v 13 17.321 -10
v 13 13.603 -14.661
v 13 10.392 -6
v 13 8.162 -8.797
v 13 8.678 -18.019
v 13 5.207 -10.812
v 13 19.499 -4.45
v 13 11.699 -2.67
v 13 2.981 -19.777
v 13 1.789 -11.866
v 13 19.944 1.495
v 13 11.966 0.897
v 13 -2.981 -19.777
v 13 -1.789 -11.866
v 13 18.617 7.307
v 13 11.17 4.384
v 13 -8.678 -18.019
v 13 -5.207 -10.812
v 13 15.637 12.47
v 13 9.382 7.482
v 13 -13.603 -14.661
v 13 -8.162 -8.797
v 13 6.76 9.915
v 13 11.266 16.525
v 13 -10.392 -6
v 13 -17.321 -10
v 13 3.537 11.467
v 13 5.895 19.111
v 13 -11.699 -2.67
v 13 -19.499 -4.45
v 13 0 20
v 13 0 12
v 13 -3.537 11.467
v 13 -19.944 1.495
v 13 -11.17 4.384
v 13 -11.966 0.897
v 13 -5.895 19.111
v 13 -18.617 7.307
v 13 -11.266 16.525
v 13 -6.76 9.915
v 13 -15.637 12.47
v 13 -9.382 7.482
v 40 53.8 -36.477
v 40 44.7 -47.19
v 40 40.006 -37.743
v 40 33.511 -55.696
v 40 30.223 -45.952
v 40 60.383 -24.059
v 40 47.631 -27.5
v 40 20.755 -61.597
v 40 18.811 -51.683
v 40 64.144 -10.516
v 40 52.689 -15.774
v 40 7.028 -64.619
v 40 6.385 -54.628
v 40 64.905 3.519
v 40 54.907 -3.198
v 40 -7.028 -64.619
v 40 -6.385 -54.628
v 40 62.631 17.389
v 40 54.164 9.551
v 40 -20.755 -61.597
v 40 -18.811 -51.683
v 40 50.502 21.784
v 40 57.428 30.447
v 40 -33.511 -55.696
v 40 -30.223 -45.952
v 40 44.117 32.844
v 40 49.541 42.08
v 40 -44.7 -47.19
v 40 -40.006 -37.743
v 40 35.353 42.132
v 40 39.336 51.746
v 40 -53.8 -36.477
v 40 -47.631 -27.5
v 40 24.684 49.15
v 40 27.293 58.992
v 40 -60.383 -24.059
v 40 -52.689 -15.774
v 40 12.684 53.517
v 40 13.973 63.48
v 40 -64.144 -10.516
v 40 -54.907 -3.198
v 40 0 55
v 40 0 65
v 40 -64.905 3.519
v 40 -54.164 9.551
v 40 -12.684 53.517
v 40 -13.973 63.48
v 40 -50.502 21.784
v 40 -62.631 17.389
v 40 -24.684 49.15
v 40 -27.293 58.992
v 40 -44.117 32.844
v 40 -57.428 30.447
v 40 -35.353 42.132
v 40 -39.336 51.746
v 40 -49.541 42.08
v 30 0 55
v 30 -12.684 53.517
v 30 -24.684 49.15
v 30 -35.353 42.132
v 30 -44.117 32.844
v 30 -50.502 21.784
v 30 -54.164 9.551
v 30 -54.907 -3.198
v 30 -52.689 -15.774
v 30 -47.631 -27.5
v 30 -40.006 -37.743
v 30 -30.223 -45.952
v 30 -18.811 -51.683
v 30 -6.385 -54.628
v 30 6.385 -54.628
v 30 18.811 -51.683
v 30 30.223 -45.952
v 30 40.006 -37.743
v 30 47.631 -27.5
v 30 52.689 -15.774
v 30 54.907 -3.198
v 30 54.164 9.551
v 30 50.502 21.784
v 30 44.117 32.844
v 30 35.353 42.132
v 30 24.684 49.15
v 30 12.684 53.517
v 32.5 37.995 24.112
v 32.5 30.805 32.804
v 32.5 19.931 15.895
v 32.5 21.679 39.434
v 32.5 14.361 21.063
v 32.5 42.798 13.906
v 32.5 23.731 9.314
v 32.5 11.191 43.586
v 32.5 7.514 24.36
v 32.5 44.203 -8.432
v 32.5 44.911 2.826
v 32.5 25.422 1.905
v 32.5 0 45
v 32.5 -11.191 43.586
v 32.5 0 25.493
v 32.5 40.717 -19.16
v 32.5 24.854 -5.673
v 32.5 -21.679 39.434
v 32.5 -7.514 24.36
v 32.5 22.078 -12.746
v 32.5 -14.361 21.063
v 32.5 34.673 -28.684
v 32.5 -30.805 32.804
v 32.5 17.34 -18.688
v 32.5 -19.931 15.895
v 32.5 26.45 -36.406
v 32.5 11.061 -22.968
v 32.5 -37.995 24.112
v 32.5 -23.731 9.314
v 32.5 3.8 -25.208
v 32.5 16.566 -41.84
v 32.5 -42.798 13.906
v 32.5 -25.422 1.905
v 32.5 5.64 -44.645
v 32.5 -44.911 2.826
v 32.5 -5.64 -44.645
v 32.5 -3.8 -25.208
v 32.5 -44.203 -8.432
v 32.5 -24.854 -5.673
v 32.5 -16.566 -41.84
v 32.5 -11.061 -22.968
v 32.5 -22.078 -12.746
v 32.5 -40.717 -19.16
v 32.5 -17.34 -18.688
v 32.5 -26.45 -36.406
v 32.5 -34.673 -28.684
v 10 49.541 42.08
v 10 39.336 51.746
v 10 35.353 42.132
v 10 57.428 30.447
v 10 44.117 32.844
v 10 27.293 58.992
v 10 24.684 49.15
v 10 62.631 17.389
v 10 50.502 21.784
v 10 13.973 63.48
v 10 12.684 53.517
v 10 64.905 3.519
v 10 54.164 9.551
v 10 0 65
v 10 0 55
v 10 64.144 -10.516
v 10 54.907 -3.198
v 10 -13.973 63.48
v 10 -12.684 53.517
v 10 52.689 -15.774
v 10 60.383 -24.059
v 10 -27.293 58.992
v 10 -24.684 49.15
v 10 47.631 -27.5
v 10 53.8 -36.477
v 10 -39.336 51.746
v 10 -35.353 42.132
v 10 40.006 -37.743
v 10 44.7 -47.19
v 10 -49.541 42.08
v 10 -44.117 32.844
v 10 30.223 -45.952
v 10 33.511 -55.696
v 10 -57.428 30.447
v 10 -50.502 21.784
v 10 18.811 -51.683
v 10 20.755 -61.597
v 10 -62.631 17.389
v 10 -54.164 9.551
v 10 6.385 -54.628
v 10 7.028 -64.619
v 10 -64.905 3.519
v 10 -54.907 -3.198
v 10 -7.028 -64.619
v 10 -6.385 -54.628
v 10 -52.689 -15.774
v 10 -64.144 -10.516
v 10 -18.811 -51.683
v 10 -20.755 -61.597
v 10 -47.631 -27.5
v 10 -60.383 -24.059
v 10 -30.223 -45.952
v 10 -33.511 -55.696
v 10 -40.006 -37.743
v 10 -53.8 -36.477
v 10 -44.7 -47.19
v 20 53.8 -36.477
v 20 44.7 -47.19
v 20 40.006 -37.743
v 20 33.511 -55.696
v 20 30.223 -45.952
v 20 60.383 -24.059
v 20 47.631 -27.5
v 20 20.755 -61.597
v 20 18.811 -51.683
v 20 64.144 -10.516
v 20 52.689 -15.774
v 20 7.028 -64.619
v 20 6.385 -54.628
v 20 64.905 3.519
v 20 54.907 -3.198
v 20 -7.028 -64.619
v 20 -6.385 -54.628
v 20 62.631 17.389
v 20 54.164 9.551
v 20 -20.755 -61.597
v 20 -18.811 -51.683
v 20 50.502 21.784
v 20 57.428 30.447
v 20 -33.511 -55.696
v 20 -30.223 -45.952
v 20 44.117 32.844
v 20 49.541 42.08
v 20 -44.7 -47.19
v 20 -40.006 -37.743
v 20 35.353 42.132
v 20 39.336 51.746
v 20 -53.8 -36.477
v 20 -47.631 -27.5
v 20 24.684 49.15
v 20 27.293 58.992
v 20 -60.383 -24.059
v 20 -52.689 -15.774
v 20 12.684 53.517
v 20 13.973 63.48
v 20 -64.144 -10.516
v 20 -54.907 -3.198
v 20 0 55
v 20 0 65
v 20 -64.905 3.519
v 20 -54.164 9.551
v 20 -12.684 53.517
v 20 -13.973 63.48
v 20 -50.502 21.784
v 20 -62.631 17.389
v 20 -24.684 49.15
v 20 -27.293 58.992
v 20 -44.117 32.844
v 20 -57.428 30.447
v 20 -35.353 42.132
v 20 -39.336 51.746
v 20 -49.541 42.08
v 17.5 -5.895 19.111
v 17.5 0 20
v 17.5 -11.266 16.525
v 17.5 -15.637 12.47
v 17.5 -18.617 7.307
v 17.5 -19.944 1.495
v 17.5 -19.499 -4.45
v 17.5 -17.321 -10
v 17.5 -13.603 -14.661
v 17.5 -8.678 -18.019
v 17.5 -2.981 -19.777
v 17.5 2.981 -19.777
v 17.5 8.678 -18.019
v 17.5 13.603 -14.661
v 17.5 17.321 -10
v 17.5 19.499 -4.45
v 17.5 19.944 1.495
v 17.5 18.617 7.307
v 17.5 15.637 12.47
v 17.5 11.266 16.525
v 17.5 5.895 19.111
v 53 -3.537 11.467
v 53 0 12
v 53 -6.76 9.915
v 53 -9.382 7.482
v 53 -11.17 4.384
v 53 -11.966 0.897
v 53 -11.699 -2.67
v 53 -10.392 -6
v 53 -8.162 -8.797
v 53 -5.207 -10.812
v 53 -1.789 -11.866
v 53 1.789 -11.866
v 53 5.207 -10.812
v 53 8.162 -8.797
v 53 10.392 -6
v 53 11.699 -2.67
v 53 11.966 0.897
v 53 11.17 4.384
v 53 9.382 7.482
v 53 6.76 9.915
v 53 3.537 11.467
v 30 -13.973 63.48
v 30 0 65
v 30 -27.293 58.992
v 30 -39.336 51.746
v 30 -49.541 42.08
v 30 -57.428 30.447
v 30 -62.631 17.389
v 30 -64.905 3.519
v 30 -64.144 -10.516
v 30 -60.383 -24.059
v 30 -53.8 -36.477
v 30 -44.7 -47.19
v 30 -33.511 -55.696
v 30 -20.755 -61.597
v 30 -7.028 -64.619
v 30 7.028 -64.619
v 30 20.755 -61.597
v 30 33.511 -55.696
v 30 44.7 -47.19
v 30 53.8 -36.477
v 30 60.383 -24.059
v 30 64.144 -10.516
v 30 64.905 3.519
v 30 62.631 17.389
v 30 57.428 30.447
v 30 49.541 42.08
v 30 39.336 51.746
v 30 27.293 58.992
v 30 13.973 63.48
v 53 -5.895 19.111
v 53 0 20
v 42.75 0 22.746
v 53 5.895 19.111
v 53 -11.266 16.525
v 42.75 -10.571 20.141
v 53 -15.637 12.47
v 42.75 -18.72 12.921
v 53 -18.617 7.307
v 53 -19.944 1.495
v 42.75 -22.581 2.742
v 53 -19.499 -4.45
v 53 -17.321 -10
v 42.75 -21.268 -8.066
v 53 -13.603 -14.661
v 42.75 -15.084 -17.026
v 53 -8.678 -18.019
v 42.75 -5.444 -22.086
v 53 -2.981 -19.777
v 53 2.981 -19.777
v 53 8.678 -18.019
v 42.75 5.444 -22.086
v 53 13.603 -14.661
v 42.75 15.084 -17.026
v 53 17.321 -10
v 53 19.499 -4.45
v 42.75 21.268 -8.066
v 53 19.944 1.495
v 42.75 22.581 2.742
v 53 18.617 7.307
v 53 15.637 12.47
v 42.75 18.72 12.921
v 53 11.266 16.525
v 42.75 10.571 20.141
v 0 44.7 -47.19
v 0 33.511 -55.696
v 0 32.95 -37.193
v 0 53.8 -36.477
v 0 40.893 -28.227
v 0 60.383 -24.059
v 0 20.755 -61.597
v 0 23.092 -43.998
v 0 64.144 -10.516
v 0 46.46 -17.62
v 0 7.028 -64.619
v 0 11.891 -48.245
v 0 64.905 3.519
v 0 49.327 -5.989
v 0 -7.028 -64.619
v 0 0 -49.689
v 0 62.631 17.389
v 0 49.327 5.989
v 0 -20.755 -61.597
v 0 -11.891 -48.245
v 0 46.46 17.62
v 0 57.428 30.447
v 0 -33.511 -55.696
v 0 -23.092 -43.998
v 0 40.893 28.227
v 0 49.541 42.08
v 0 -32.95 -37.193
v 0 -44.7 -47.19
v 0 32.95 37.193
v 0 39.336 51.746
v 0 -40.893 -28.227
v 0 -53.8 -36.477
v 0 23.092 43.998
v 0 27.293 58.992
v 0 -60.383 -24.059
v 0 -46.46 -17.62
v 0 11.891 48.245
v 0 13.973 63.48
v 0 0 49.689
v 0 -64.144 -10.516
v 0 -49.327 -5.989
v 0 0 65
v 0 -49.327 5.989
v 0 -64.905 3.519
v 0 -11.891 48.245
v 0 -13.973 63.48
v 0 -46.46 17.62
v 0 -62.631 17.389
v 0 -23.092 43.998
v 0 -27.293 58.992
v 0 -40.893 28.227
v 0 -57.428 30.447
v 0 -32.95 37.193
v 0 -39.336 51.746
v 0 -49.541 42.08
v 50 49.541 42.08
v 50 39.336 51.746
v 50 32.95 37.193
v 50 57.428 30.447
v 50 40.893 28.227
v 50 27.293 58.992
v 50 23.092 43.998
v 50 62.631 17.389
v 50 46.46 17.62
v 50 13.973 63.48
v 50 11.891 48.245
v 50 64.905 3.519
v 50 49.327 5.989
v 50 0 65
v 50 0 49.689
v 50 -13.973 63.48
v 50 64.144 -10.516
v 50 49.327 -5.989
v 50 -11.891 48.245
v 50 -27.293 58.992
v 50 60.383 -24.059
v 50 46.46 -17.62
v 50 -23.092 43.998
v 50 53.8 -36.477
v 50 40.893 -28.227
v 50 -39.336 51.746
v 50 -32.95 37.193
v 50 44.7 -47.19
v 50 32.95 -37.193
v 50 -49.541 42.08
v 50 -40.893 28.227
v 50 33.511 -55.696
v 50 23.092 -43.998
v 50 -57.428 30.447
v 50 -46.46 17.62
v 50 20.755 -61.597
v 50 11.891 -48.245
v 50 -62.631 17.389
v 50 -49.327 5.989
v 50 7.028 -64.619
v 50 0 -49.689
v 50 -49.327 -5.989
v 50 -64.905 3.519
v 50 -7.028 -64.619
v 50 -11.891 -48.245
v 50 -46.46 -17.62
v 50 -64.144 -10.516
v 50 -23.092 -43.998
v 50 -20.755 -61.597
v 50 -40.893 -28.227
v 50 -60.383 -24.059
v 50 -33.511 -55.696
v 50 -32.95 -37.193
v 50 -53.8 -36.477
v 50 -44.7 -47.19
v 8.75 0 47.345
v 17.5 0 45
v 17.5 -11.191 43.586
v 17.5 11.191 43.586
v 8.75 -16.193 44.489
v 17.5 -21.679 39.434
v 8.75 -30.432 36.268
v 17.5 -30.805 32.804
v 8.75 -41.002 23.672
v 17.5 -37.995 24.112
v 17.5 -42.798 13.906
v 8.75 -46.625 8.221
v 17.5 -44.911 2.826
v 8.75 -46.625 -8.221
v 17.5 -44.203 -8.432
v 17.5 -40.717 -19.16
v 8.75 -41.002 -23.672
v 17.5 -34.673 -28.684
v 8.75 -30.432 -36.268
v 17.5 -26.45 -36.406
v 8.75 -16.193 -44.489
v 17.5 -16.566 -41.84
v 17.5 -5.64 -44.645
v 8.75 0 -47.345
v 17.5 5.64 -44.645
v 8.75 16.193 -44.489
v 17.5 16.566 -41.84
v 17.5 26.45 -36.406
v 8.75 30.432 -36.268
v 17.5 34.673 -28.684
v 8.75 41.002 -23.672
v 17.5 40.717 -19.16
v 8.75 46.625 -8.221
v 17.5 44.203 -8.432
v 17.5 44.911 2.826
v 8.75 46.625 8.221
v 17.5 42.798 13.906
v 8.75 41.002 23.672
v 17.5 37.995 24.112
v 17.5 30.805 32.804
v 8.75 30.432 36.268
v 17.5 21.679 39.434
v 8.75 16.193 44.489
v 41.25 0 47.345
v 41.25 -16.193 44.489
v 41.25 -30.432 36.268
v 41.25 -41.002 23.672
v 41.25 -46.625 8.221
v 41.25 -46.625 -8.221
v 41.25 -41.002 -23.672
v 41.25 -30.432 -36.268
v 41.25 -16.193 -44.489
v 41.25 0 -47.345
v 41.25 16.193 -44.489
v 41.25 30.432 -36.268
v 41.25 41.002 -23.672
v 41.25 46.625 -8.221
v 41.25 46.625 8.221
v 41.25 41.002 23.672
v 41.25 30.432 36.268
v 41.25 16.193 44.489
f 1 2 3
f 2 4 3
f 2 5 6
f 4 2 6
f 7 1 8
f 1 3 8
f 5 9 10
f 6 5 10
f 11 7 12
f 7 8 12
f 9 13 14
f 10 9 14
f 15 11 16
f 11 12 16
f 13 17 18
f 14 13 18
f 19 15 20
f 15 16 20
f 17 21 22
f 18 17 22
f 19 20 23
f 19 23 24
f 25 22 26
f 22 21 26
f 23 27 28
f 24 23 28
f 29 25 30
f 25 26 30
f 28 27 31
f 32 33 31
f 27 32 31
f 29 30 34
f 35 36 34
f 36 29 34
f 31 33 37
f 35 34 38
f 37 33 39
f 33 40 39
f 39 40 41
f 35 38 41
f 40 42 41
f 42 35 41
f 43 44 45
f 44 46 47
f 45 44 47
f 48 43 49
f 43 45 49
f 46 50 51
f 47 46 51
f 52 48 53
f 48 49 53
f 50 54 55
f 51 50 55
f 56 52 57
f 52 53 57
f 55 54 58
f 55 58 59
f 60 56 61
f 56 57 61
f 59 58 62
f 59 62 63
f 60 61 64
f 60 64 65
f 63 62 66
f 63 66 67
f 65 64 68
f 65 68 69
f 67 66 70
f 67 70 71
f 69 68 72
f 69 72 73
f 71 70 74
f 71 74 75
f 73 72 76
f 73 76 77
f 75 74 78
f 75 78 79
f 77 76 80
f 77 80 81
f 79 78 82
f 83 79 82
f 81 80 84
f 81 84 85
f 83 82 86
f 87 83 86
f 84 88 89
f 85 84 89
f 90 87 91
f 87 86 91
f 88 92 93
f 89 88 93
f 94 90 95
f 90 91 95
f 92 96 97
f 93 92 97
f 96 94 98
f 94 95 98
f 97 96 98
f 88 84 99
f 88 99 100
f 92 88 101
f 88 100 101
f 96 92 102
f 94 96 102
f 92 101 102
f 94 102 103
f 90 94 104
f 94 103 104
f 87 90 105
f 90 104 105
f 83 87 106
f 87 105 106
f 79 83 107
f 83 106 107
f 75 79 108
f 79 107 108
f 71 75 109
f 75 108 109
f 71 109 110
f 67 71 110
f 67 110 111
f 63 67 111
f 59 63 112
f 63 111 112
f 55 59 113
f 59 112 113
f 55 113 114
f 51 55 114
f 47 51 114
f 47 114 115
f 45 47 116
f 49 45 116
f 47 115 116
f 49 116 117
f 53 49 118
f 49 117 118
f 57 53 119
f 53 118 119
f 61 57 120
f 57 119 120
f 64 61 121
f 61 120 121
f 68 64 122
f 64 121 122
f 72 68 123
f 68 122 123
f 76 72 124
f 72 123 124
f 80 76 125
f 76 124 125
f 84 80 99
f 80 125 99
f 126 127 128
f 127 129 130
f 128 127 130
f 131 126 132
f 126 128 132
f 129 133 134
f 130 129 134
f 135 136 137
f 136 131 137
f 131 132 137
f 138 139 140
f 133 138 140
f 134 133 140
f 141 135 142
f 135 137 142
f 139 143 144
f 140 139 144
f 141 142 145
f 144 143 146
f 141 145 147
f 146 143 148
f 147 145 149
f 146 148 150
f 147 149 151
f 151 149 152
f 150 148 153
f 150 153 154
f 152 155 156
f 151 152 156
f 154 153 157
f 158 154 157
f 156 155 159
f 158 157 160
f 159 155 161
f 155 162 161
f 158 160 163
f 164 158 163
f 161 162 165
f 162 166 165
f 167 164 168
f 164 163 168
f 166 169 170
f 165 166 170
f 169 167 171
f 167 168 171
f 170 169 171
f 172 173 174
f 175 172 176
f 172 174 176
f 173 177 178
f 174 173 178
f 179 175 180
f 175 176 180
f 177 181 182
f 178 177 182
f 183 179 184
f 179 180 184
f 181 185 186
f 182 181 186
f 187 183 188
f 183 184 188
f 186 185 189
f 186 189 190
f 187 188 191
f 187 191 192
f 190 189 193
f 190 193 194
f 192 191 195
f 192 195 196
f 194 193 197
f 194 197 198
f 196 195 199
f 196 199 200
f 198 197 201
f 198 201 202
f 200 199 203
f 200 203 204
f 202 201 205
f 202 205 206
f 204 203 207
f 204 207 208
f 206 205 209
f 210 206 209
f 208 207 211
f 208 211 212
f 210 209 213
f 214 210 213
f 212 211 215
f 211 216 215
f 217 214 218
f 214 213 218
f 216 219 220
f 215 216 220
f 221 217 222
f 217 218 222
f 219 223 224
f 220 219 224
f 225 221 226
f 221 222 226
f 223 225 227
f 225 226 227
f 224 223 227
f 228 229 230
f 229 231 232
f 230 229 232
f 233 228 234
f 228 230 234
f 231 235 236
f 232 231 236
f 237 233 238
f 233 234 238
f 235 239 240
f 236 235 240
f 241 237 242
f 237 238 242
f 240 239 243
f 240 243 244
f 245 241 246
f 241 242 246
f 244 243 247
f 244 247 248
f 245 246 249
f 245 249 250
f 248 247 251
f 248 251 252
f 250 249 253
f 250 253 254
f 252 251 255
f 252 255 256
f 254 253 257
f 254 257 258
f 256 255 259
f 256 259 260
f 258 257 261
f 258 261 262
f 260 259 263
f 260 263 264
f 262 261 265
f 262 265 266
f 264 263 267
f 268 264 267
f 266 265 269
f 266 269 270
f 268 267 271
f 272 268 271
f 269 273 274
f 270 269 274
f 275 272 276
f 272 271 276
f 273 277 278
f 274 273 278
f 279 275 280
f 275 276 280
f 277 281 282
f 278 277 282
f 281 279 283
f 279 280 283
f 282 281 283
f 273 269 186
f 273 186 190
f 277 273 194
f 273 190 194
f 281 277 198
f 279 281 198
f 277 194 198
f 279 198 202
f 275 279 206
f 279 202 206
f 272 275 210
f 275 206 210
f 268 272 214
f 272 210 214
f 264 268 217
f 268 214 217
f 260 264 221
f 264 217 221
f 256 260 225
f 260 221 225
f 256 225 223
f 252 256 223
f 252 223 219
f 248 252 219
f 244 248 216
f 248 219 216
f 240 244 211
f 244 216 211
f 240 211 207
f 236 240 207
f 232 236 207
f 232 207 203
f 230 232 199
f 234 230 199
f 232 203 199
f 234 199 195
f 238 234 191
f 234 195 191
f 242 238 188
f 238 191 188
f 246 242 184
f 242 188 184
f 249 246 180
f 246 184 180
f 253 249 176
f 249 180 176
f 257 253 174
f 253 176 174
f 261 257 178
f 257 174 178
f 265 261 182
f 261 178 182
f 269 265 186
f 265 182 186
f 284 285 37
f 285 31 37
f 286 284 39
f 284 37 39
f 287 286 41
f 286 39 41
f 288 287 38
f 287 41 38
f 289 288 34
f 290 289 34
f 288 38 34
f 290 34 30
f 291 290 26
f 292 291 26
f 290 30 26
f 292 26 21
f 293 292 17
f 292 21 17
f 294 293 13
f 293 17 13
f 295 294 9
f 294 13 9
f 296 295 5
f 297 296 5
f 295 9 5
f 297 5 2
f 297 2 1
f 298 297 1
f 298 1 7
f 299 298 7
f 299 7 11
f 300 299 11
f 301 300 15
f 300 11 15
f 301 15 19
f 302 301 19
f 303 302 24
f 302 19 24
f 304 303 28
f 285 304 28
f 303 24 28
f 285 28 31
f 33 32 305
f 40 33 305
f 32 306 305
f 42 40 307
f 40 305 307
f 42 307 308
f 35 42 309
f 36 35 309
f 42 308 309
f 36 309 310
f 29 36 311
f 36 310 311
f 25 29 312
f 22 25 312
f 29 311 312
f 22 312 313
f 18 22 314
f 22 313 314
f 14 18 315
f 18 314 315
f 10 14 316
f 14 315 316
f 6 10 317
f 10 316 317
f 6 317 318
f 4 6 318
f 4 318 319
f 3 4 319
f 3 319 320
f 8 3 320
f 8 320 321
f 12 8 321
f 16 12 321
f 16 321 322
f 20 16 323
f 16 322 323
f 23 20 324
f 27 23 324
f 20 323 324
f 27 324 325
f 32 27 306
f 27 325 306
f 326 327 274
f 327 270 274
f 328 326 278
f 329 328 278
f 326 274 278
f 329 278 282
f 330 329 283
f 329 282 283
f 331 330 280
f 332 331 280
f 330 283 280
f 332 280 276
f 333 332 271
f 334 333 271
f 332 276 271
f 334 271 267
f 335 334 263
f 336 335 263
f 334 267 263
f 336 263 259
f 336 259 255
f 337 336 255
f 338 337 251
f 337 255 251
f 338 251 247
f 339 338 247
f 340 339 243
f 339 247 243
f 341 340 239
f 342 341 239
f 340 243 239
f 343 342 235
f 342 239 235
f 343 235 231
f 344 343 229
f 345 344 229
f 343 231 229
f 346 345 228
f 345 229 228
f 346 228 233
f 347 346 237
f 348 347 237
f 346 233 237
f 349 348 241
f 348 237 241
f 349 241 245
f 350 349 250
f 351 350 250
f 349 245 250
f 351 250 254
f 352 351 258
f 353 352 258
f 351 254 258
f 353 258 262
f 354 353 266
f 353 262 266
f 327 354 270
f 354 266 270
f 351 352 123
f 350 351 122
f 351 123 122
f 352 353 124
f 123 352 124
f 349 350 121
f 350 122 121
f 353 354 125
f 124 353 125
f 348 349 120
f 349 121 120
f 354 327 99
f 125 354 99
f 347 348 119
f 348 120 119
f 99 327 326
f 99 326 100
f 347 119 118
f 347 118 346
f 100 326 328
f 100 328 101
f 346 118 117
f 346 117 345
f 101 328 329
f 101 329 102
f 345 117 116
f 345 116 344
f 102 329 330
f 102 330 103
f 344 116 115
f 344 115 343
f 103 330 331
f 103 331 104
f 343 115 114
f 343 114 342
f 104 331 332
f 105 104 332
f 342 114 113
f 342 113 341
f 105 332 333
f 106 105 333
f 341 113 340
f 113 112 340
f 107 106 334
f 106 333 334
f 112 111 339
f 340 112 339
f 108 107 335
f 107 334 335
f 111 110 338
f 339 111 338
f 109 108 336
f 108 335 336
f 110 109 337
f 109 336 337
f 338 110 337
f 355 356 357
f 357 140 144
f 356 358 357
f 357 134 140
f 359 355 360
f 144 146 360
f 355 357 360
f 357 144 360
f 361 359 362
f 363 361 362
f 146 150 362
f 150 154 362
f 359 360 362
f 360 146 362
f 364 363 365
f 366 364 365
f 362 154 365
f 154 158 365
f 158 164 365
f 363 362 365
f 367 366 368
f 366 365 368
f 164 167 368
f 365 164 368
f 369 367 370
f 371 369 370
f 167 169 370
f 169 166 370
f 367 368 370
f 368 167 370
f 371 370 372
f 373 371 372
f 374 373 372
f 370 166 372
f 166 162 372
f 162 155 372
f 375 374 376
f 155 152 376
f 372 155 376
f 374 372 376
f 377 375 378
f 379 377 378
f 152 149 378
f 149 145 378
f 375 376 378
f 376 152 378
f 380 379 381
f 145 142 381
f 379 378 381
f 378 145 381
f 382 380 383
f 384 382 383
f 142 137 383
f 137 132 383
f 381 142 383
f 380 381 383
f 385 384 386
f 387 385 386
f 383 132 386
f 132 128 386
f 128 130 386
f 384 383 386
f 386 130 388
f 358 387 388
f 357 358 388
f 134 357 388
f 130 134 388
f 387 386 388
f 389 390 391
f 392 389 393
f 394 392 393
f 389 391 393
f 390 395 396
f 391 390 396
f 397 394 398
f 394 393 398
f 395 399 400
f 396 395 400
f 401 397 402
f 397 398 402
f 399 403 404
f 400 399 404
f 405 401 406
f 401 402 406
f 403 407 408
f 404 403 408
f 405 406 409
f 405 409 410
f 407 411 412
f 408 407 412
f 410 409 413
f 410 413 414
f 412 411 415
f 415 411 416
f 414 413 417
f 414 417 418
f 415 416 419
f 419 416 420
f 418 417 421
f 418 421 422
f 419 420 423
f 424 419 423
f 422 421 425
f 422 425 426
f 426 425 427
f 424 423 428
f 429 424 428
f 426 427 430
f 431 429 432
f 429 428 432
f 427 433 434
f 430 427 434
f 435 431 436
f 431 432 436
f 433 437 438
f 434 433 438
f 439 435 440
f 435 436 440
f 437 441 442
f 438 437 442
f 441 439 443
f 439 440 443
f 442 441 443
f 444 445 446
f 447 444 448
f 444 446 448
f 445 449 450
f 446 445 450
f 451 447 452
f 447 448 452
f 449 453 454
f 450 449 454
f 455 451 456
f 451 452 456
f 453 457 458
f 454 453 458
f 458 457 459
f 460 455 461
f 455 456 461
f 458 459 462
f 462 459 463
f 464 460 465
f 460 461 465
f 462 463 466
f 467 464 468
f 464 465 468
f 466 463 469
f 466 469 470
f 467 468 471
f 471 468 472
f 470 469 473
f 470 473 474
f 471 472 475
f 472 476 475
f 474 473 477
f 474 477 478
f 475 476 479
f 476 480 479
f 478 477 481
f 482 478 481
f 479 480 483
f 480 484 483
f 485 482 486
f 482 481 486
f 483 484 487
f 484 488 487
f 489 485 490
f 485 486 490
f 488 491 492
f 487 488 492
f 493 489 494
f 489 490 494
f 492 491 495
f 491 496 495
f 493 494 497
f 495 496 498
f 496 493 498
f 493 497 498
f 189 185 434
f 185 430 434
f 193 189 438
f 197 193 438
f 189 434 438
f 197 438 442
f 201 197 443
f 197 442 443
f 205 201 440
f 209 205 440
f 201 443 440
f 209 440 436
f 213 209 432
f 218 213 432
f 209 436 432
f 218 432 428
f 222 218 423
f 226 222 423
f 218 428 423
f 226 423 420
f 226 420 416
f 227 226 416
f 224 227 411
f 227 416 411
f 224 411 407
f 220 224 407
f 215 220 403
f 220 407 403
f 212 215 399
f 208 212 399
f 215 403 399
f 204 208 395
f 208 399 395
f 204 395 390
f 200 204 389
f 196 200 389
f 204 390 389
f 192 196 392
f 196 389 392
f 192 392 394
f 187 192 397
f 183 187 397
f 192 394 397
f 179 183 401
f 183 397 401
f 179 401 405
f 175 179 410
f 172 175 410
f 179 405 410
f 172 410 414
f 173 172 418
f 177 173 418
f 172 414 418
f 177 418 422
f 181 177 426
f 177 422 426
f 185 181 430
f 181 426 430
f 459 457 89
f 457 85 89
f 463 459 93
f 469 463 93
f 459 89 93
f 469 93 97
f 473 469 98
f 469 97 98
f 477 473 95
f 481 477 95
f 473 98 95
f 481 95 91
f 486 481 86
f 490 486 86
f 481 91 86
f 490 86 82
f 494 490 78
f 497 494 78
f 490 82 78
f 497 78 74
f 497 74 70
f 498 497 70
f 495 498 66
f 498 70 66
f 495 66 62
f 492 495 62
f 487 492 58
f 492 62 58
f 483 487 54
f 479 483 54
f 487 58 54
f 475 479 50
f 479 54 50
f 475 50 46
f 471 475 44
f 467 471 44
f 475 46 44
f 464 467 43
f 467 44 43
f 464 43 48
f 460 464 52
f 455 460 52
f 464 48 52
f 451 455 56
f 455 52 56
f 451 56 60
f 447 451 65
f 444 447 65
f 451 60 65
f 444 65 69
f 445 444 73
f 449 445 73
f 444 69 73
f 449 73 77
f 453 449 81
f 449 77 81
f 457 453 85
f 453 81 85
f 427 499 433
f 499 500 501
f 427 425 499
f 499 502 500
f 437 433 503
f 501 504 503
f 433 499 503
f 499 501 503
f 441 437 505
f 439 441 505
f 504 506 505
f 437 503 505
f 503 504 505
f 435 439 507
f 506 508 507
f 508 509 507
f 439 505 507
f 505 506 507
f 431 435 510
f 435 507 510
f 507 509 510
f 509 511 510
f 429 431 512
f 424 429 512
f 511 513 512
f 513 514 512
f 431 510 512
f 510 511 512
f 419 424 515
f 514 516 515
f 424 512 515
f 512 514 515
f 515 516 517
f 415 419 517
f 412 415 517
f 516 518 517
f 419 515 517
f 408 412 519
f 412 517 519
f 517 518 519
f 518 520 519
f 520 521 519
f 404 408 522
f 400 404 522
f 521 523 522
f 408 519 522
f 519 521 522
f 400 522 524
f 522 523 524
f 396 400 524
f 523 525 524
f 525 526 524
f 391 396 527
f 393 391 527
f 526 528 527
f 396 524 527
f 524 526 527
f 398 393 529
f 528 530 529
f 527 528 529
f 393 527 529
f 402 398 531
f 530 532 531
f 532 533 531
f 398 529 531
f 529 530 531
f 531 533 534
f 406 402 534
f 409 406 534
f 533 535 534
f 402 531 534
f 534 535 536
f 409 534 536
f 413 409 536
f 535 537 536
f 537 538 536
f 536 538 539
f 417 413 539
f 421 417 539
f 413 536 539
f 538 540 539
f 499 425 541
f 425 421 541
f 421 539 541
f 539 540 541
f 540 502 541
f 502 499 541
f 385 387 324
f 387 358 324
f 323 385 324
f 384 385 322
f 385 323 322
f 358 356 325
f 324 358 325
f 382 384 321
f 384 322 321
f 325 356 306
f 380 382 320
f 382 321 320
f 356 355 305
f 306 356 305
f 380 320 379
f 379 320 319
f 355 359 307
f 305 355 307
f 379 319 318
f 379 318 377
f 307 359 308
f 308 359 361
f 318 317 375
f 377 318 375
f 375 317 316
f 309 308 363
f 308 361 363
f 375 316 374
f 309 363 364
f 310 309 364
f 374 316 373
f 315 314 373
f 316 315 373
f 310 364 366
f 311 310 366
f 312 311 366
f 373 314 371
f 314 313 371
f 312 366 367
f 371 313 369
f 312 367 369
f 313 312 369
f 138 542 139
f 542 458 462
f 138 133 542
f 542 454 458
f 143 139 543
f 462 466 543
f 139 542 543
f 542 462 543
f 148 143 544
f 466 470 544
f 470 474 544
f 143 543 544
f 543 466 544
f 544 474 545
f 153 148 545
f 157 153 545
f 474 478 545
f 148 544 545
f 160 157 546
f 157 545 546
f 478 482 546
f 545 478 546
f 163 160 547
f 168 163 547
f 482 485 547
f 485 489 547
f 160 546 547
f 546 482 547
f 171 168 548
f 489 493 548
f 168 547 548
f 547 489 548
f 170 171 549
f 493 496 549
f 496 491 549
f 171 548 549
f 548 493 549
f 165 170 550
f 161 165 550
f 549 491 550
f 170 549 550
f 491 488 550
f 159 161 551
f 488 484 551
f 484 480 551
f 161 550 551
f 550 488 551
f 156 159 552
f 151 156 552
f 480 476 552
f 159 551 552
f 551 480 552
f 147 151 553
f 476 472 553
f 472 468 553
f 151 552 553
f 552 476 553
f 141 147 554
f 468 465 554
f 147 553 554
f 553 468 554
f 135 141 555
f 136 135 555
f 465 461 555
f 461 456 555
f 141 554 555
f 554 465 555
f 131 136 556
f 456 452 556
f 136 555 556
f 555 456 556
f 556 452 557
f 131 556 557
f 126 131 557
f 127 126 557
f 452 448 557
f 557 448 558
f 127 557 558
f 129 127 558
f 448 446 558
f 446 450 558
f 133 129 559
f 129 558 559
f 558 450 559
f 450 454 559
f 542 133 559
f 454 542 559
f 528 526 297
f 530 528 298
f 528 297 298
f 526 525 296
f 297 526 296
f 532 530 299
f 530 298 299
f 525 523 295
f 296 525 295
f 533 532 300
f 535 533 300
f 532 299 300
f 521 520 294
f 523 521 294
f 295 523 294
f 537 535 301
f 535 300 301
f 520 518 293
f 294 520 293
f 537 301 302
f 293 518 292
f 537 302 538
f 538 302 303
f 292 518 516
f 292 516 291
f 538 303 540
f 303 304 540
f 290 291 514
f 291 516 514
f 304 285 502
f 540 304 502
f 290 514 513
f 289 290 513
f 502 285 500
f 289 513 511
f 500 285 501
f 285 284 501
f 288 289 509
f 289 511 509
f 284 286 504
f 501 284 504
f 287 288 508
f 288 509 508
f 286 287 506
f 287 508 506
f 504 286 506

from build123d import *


with BuildPart() as part:
    # Эскиз1 → Повернуть1 (revolve)
    with BuildSketch(Plane.XY, mode=Mode.PRIVATE) as revolve_1_sk:
        Polygon((0, 65), (0, 49.689110868), (17.5, 45), (17.5, 20), (13, 20), (13, 12), (53, 12), (53, 20), (32.5, 25.492958445), (32.5, 45), (50, 49.689110868), (50, 65), (40, 65), (40, 55), (30, 55), (30, 65), (20, 65), (20, 55), (10, 55), (10, 65), align=None)
    revolve(revolve_1_sk.sketch.rotate(Axis((-926.28656243, 0, 0), (1, 0, 0)), 90), axis=Axis((-926.28656243, 0, 0), (1, 0, 0)))


solid = part.part
